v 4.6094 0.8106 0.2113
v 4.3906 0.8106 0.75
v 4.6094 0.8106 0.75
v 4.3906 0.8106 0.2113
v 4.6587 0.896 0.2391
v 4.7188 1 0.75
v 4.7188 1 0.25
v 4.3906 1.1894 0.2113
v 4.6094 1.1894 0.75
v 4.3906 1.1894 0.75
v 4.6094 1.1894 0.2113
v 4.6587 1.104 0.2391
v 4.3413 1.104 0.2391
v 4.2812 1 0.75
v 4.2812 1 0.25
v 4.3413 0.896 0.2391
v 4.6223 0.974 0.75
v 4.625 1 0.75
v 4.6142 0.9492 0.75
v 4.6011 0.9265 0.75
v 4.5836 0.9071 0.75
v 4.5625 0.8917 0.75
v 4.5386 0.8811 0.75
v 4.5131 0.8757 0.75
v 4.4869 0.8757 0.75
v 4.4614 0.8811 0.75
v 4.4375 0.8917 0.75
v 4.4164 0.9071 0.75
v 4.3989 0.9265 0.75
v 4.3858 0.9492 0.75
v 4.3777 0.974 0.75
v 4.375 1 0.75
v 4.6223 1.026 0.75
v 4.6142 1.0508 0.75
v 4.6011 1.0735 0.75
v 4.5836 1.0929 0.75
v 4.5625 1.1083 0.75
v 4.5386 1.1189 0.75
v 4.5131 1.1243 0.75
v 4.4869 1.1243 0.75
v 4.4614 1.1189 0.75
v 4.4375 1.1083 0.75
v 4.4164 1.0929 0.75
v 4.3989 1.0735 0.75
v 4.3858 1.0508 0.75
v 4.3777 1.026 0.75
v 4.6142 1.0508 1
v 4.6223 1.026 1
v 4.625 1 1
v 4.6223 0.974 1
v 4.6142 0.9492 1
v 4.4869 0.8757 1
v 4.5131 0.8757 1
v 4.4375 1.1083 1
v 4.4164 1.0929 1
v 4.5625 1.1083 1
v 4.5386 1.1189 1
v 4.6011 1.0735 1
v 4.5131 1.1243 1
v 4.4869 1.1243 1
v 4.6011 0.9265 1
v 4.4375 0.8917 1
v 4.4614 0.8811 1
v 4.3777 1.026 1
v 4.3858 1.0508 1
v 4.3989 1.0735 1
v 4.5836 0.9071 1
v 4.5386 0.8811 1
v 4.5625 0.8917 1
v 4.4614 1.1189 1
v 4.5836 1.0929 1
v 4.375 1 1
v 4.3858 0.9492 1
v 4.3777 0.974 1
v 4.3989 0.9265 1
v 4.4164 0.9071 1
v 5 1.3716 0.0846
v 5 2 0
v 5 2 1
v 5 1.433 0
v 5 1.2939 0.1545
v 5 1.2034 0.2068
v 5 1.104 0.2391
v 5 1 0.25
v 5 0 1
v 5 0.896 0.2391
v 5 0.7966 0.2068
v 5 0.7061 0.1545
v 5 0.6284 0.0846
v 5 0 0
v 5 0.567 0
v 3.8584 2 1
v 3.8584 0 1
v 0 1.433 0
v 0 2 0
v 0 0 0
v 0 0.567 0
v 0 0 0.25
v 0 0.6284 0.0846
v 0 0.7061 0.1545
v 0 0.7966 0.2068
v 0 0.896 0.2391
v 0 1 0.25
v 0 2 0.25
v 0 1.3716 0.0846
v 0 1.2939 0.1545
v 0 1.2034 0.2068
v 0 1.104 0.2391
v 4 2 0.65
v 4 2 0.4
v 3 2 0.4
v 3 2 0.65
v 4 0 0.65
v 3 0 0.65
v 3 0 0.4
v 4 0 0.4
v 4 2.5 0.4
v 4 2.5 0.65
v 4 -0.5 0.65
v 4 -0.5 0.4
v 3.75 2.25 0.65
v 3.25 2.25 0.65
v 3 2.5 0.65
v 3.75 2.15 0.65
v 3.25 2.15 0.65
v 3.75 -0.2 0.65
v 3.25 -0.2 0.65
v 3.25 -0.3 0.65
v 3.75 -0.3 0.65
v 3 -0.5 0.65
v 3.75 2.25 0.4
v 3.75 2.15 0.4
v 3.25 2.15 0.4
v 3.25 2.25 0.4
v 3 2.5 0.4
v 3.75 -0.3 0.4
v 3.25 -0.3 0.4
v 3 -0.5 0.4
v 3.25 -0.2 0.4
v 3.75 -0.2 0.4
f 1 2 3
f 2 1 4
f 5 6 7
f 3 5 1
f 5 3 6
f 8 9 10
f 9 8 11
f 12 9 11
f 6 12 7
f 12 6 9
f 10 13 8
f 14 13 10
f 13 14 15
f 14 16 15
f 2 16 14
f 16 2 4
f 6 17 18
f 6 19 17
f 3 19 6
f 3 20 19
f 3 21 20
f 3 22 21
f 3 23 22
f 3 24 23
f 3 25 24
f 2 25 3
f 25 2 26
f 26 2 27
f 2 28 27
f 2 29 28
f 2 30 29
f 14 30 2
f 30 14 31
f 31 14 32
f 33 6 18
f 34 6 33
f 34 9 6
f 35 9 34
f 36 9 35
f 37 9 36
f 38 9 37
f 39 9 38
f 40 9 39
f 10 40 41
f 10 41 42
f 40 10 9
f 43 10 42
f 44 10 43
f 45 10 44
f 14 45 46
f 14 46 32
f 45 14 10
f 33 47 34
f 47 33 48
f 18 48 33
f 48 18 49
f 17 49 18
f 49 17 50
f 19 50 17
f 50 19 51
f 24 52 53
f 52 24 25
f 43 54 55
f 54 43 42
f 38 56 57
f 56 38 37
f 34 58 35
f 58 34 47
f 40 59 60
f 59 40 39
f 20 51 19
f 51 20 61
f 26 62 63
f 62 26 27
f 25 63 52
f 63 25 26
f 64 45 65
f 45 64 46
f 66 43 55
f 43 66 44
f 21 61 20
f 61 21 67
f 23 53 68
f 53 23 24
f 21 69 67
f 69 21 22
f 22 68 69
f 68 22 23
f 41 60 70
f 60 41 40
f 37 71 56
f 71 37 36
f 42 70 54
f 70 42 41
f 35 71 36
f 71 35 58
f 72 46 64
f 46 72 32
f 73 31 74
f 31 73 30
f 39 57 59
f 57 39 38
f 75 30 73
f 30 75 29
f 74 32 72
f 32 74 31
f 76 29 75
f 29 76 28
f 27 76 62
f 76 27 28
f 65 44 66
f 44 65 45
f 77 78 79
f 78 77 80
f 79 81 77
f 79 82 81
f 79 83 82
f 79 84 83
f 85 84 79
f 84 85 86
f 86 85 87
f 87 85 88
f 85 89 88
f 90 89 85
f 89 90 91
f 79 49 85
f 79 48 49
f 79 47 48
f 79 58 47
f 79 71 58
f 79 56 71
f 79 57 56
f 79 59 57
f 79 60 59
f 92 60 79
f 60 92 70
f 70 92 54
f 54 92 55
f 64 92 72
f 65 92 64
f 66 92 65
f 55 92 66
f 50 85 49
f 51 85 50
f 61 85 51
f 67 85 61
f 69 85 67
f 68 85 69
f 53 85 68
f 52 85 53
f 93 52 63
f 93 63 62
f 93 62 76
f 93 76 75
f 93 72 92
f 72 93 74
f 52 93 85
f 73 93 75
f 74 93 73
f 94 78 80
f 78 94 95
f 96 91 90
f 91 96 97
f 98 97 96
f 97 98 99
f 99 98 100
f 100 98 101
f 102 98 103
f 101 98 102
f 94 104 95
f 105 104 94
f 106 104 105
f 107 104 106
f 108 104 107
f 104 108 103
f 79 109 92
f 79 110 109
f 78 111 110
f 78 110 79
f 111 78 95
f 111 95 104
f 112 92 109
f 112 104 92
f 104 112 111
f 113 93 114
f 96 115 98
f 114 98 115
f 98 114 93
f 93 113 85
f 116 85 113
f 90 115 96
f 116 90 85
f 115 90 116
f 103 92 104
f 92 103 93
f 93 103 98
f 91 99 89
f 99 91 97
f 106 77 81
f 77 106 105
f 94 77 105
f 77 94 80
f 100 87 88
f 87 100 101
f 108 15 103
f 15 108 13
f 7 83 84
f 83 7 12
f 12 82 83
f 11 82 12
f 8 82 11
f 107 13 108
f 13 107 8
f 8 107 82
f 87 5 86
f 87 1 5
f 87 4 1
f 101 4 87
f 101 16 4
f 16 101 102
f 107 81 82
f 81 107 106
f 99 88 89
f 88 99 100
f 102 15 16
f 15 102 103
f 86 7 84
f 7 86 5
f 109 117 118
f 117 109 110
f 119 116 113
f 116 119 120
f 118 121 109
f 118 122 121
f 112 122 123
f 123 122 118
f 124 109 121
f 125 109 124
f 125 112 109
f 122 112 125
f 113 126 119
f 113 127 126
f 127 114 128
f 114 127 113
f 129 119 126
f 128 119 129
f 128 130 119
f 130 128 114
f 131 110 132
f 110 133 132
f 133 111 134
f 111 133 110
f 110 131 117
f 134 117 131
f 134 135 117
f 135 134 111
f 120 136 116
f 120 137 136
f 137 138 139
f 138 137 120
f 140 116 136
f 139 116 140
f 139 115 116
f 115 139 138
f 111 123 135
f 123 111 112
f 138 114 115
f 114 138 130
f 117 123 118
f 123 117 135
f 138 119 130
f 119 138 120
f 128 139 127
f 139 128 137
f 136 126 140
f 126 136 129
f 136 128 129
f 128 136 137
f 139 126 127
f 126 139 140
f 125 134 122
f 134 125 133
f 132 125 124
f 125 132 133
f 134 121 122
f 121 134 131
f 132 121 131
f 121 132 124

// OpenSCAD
// Trying to be a trekking pole camera mount
// jellsworth Dec 2014
//
// units = inches


union() {
	difference() {
	
		// base block
		cube([ 5, 2, 1 ], false);
	
		// remove wedge
		translate([ 0, 0, 0.25]) {
			rotate([ 0, -11, 0]) {
				cube([ 5, 2, 1 ], false);
			}
		}
	
		// remove pole channel
		translate([ 0, 1, -0.25]) {
			rotate([ 0, 90, 0]) {
				cylinder(h = 6, r1 = 0.5, r2 = 0.5, center = false, $fn=30);
			}
		}
		//cut hole for bolt
		//1/4" - 20 x 3/4" (w/ 7/16" head)
		translate([4.5, 1, 0]){
			cylinder(h = 0.75, d=7/16, $fn=6);
			cylinder(h = 1.5, d=1/4, $fn=30);
		}
	}

	difference() {
		// add strap supports
		translate( [3, -0.5, 0.4]) {
			cube([ 1, 3, 0.25]);
		}
		
		// cut strap holes
		translate([3.25, -0.2, 0]){
			rotate([90, 0, 0]) {
				cube([0.5, 2, 0.1], false);
			}
		}
		translate([3.25, 2.25, 0]){
			rotate([90, 0, 0]) {
				cube([0.5, 2, 0.1], false);
			}
		}
	}

}
